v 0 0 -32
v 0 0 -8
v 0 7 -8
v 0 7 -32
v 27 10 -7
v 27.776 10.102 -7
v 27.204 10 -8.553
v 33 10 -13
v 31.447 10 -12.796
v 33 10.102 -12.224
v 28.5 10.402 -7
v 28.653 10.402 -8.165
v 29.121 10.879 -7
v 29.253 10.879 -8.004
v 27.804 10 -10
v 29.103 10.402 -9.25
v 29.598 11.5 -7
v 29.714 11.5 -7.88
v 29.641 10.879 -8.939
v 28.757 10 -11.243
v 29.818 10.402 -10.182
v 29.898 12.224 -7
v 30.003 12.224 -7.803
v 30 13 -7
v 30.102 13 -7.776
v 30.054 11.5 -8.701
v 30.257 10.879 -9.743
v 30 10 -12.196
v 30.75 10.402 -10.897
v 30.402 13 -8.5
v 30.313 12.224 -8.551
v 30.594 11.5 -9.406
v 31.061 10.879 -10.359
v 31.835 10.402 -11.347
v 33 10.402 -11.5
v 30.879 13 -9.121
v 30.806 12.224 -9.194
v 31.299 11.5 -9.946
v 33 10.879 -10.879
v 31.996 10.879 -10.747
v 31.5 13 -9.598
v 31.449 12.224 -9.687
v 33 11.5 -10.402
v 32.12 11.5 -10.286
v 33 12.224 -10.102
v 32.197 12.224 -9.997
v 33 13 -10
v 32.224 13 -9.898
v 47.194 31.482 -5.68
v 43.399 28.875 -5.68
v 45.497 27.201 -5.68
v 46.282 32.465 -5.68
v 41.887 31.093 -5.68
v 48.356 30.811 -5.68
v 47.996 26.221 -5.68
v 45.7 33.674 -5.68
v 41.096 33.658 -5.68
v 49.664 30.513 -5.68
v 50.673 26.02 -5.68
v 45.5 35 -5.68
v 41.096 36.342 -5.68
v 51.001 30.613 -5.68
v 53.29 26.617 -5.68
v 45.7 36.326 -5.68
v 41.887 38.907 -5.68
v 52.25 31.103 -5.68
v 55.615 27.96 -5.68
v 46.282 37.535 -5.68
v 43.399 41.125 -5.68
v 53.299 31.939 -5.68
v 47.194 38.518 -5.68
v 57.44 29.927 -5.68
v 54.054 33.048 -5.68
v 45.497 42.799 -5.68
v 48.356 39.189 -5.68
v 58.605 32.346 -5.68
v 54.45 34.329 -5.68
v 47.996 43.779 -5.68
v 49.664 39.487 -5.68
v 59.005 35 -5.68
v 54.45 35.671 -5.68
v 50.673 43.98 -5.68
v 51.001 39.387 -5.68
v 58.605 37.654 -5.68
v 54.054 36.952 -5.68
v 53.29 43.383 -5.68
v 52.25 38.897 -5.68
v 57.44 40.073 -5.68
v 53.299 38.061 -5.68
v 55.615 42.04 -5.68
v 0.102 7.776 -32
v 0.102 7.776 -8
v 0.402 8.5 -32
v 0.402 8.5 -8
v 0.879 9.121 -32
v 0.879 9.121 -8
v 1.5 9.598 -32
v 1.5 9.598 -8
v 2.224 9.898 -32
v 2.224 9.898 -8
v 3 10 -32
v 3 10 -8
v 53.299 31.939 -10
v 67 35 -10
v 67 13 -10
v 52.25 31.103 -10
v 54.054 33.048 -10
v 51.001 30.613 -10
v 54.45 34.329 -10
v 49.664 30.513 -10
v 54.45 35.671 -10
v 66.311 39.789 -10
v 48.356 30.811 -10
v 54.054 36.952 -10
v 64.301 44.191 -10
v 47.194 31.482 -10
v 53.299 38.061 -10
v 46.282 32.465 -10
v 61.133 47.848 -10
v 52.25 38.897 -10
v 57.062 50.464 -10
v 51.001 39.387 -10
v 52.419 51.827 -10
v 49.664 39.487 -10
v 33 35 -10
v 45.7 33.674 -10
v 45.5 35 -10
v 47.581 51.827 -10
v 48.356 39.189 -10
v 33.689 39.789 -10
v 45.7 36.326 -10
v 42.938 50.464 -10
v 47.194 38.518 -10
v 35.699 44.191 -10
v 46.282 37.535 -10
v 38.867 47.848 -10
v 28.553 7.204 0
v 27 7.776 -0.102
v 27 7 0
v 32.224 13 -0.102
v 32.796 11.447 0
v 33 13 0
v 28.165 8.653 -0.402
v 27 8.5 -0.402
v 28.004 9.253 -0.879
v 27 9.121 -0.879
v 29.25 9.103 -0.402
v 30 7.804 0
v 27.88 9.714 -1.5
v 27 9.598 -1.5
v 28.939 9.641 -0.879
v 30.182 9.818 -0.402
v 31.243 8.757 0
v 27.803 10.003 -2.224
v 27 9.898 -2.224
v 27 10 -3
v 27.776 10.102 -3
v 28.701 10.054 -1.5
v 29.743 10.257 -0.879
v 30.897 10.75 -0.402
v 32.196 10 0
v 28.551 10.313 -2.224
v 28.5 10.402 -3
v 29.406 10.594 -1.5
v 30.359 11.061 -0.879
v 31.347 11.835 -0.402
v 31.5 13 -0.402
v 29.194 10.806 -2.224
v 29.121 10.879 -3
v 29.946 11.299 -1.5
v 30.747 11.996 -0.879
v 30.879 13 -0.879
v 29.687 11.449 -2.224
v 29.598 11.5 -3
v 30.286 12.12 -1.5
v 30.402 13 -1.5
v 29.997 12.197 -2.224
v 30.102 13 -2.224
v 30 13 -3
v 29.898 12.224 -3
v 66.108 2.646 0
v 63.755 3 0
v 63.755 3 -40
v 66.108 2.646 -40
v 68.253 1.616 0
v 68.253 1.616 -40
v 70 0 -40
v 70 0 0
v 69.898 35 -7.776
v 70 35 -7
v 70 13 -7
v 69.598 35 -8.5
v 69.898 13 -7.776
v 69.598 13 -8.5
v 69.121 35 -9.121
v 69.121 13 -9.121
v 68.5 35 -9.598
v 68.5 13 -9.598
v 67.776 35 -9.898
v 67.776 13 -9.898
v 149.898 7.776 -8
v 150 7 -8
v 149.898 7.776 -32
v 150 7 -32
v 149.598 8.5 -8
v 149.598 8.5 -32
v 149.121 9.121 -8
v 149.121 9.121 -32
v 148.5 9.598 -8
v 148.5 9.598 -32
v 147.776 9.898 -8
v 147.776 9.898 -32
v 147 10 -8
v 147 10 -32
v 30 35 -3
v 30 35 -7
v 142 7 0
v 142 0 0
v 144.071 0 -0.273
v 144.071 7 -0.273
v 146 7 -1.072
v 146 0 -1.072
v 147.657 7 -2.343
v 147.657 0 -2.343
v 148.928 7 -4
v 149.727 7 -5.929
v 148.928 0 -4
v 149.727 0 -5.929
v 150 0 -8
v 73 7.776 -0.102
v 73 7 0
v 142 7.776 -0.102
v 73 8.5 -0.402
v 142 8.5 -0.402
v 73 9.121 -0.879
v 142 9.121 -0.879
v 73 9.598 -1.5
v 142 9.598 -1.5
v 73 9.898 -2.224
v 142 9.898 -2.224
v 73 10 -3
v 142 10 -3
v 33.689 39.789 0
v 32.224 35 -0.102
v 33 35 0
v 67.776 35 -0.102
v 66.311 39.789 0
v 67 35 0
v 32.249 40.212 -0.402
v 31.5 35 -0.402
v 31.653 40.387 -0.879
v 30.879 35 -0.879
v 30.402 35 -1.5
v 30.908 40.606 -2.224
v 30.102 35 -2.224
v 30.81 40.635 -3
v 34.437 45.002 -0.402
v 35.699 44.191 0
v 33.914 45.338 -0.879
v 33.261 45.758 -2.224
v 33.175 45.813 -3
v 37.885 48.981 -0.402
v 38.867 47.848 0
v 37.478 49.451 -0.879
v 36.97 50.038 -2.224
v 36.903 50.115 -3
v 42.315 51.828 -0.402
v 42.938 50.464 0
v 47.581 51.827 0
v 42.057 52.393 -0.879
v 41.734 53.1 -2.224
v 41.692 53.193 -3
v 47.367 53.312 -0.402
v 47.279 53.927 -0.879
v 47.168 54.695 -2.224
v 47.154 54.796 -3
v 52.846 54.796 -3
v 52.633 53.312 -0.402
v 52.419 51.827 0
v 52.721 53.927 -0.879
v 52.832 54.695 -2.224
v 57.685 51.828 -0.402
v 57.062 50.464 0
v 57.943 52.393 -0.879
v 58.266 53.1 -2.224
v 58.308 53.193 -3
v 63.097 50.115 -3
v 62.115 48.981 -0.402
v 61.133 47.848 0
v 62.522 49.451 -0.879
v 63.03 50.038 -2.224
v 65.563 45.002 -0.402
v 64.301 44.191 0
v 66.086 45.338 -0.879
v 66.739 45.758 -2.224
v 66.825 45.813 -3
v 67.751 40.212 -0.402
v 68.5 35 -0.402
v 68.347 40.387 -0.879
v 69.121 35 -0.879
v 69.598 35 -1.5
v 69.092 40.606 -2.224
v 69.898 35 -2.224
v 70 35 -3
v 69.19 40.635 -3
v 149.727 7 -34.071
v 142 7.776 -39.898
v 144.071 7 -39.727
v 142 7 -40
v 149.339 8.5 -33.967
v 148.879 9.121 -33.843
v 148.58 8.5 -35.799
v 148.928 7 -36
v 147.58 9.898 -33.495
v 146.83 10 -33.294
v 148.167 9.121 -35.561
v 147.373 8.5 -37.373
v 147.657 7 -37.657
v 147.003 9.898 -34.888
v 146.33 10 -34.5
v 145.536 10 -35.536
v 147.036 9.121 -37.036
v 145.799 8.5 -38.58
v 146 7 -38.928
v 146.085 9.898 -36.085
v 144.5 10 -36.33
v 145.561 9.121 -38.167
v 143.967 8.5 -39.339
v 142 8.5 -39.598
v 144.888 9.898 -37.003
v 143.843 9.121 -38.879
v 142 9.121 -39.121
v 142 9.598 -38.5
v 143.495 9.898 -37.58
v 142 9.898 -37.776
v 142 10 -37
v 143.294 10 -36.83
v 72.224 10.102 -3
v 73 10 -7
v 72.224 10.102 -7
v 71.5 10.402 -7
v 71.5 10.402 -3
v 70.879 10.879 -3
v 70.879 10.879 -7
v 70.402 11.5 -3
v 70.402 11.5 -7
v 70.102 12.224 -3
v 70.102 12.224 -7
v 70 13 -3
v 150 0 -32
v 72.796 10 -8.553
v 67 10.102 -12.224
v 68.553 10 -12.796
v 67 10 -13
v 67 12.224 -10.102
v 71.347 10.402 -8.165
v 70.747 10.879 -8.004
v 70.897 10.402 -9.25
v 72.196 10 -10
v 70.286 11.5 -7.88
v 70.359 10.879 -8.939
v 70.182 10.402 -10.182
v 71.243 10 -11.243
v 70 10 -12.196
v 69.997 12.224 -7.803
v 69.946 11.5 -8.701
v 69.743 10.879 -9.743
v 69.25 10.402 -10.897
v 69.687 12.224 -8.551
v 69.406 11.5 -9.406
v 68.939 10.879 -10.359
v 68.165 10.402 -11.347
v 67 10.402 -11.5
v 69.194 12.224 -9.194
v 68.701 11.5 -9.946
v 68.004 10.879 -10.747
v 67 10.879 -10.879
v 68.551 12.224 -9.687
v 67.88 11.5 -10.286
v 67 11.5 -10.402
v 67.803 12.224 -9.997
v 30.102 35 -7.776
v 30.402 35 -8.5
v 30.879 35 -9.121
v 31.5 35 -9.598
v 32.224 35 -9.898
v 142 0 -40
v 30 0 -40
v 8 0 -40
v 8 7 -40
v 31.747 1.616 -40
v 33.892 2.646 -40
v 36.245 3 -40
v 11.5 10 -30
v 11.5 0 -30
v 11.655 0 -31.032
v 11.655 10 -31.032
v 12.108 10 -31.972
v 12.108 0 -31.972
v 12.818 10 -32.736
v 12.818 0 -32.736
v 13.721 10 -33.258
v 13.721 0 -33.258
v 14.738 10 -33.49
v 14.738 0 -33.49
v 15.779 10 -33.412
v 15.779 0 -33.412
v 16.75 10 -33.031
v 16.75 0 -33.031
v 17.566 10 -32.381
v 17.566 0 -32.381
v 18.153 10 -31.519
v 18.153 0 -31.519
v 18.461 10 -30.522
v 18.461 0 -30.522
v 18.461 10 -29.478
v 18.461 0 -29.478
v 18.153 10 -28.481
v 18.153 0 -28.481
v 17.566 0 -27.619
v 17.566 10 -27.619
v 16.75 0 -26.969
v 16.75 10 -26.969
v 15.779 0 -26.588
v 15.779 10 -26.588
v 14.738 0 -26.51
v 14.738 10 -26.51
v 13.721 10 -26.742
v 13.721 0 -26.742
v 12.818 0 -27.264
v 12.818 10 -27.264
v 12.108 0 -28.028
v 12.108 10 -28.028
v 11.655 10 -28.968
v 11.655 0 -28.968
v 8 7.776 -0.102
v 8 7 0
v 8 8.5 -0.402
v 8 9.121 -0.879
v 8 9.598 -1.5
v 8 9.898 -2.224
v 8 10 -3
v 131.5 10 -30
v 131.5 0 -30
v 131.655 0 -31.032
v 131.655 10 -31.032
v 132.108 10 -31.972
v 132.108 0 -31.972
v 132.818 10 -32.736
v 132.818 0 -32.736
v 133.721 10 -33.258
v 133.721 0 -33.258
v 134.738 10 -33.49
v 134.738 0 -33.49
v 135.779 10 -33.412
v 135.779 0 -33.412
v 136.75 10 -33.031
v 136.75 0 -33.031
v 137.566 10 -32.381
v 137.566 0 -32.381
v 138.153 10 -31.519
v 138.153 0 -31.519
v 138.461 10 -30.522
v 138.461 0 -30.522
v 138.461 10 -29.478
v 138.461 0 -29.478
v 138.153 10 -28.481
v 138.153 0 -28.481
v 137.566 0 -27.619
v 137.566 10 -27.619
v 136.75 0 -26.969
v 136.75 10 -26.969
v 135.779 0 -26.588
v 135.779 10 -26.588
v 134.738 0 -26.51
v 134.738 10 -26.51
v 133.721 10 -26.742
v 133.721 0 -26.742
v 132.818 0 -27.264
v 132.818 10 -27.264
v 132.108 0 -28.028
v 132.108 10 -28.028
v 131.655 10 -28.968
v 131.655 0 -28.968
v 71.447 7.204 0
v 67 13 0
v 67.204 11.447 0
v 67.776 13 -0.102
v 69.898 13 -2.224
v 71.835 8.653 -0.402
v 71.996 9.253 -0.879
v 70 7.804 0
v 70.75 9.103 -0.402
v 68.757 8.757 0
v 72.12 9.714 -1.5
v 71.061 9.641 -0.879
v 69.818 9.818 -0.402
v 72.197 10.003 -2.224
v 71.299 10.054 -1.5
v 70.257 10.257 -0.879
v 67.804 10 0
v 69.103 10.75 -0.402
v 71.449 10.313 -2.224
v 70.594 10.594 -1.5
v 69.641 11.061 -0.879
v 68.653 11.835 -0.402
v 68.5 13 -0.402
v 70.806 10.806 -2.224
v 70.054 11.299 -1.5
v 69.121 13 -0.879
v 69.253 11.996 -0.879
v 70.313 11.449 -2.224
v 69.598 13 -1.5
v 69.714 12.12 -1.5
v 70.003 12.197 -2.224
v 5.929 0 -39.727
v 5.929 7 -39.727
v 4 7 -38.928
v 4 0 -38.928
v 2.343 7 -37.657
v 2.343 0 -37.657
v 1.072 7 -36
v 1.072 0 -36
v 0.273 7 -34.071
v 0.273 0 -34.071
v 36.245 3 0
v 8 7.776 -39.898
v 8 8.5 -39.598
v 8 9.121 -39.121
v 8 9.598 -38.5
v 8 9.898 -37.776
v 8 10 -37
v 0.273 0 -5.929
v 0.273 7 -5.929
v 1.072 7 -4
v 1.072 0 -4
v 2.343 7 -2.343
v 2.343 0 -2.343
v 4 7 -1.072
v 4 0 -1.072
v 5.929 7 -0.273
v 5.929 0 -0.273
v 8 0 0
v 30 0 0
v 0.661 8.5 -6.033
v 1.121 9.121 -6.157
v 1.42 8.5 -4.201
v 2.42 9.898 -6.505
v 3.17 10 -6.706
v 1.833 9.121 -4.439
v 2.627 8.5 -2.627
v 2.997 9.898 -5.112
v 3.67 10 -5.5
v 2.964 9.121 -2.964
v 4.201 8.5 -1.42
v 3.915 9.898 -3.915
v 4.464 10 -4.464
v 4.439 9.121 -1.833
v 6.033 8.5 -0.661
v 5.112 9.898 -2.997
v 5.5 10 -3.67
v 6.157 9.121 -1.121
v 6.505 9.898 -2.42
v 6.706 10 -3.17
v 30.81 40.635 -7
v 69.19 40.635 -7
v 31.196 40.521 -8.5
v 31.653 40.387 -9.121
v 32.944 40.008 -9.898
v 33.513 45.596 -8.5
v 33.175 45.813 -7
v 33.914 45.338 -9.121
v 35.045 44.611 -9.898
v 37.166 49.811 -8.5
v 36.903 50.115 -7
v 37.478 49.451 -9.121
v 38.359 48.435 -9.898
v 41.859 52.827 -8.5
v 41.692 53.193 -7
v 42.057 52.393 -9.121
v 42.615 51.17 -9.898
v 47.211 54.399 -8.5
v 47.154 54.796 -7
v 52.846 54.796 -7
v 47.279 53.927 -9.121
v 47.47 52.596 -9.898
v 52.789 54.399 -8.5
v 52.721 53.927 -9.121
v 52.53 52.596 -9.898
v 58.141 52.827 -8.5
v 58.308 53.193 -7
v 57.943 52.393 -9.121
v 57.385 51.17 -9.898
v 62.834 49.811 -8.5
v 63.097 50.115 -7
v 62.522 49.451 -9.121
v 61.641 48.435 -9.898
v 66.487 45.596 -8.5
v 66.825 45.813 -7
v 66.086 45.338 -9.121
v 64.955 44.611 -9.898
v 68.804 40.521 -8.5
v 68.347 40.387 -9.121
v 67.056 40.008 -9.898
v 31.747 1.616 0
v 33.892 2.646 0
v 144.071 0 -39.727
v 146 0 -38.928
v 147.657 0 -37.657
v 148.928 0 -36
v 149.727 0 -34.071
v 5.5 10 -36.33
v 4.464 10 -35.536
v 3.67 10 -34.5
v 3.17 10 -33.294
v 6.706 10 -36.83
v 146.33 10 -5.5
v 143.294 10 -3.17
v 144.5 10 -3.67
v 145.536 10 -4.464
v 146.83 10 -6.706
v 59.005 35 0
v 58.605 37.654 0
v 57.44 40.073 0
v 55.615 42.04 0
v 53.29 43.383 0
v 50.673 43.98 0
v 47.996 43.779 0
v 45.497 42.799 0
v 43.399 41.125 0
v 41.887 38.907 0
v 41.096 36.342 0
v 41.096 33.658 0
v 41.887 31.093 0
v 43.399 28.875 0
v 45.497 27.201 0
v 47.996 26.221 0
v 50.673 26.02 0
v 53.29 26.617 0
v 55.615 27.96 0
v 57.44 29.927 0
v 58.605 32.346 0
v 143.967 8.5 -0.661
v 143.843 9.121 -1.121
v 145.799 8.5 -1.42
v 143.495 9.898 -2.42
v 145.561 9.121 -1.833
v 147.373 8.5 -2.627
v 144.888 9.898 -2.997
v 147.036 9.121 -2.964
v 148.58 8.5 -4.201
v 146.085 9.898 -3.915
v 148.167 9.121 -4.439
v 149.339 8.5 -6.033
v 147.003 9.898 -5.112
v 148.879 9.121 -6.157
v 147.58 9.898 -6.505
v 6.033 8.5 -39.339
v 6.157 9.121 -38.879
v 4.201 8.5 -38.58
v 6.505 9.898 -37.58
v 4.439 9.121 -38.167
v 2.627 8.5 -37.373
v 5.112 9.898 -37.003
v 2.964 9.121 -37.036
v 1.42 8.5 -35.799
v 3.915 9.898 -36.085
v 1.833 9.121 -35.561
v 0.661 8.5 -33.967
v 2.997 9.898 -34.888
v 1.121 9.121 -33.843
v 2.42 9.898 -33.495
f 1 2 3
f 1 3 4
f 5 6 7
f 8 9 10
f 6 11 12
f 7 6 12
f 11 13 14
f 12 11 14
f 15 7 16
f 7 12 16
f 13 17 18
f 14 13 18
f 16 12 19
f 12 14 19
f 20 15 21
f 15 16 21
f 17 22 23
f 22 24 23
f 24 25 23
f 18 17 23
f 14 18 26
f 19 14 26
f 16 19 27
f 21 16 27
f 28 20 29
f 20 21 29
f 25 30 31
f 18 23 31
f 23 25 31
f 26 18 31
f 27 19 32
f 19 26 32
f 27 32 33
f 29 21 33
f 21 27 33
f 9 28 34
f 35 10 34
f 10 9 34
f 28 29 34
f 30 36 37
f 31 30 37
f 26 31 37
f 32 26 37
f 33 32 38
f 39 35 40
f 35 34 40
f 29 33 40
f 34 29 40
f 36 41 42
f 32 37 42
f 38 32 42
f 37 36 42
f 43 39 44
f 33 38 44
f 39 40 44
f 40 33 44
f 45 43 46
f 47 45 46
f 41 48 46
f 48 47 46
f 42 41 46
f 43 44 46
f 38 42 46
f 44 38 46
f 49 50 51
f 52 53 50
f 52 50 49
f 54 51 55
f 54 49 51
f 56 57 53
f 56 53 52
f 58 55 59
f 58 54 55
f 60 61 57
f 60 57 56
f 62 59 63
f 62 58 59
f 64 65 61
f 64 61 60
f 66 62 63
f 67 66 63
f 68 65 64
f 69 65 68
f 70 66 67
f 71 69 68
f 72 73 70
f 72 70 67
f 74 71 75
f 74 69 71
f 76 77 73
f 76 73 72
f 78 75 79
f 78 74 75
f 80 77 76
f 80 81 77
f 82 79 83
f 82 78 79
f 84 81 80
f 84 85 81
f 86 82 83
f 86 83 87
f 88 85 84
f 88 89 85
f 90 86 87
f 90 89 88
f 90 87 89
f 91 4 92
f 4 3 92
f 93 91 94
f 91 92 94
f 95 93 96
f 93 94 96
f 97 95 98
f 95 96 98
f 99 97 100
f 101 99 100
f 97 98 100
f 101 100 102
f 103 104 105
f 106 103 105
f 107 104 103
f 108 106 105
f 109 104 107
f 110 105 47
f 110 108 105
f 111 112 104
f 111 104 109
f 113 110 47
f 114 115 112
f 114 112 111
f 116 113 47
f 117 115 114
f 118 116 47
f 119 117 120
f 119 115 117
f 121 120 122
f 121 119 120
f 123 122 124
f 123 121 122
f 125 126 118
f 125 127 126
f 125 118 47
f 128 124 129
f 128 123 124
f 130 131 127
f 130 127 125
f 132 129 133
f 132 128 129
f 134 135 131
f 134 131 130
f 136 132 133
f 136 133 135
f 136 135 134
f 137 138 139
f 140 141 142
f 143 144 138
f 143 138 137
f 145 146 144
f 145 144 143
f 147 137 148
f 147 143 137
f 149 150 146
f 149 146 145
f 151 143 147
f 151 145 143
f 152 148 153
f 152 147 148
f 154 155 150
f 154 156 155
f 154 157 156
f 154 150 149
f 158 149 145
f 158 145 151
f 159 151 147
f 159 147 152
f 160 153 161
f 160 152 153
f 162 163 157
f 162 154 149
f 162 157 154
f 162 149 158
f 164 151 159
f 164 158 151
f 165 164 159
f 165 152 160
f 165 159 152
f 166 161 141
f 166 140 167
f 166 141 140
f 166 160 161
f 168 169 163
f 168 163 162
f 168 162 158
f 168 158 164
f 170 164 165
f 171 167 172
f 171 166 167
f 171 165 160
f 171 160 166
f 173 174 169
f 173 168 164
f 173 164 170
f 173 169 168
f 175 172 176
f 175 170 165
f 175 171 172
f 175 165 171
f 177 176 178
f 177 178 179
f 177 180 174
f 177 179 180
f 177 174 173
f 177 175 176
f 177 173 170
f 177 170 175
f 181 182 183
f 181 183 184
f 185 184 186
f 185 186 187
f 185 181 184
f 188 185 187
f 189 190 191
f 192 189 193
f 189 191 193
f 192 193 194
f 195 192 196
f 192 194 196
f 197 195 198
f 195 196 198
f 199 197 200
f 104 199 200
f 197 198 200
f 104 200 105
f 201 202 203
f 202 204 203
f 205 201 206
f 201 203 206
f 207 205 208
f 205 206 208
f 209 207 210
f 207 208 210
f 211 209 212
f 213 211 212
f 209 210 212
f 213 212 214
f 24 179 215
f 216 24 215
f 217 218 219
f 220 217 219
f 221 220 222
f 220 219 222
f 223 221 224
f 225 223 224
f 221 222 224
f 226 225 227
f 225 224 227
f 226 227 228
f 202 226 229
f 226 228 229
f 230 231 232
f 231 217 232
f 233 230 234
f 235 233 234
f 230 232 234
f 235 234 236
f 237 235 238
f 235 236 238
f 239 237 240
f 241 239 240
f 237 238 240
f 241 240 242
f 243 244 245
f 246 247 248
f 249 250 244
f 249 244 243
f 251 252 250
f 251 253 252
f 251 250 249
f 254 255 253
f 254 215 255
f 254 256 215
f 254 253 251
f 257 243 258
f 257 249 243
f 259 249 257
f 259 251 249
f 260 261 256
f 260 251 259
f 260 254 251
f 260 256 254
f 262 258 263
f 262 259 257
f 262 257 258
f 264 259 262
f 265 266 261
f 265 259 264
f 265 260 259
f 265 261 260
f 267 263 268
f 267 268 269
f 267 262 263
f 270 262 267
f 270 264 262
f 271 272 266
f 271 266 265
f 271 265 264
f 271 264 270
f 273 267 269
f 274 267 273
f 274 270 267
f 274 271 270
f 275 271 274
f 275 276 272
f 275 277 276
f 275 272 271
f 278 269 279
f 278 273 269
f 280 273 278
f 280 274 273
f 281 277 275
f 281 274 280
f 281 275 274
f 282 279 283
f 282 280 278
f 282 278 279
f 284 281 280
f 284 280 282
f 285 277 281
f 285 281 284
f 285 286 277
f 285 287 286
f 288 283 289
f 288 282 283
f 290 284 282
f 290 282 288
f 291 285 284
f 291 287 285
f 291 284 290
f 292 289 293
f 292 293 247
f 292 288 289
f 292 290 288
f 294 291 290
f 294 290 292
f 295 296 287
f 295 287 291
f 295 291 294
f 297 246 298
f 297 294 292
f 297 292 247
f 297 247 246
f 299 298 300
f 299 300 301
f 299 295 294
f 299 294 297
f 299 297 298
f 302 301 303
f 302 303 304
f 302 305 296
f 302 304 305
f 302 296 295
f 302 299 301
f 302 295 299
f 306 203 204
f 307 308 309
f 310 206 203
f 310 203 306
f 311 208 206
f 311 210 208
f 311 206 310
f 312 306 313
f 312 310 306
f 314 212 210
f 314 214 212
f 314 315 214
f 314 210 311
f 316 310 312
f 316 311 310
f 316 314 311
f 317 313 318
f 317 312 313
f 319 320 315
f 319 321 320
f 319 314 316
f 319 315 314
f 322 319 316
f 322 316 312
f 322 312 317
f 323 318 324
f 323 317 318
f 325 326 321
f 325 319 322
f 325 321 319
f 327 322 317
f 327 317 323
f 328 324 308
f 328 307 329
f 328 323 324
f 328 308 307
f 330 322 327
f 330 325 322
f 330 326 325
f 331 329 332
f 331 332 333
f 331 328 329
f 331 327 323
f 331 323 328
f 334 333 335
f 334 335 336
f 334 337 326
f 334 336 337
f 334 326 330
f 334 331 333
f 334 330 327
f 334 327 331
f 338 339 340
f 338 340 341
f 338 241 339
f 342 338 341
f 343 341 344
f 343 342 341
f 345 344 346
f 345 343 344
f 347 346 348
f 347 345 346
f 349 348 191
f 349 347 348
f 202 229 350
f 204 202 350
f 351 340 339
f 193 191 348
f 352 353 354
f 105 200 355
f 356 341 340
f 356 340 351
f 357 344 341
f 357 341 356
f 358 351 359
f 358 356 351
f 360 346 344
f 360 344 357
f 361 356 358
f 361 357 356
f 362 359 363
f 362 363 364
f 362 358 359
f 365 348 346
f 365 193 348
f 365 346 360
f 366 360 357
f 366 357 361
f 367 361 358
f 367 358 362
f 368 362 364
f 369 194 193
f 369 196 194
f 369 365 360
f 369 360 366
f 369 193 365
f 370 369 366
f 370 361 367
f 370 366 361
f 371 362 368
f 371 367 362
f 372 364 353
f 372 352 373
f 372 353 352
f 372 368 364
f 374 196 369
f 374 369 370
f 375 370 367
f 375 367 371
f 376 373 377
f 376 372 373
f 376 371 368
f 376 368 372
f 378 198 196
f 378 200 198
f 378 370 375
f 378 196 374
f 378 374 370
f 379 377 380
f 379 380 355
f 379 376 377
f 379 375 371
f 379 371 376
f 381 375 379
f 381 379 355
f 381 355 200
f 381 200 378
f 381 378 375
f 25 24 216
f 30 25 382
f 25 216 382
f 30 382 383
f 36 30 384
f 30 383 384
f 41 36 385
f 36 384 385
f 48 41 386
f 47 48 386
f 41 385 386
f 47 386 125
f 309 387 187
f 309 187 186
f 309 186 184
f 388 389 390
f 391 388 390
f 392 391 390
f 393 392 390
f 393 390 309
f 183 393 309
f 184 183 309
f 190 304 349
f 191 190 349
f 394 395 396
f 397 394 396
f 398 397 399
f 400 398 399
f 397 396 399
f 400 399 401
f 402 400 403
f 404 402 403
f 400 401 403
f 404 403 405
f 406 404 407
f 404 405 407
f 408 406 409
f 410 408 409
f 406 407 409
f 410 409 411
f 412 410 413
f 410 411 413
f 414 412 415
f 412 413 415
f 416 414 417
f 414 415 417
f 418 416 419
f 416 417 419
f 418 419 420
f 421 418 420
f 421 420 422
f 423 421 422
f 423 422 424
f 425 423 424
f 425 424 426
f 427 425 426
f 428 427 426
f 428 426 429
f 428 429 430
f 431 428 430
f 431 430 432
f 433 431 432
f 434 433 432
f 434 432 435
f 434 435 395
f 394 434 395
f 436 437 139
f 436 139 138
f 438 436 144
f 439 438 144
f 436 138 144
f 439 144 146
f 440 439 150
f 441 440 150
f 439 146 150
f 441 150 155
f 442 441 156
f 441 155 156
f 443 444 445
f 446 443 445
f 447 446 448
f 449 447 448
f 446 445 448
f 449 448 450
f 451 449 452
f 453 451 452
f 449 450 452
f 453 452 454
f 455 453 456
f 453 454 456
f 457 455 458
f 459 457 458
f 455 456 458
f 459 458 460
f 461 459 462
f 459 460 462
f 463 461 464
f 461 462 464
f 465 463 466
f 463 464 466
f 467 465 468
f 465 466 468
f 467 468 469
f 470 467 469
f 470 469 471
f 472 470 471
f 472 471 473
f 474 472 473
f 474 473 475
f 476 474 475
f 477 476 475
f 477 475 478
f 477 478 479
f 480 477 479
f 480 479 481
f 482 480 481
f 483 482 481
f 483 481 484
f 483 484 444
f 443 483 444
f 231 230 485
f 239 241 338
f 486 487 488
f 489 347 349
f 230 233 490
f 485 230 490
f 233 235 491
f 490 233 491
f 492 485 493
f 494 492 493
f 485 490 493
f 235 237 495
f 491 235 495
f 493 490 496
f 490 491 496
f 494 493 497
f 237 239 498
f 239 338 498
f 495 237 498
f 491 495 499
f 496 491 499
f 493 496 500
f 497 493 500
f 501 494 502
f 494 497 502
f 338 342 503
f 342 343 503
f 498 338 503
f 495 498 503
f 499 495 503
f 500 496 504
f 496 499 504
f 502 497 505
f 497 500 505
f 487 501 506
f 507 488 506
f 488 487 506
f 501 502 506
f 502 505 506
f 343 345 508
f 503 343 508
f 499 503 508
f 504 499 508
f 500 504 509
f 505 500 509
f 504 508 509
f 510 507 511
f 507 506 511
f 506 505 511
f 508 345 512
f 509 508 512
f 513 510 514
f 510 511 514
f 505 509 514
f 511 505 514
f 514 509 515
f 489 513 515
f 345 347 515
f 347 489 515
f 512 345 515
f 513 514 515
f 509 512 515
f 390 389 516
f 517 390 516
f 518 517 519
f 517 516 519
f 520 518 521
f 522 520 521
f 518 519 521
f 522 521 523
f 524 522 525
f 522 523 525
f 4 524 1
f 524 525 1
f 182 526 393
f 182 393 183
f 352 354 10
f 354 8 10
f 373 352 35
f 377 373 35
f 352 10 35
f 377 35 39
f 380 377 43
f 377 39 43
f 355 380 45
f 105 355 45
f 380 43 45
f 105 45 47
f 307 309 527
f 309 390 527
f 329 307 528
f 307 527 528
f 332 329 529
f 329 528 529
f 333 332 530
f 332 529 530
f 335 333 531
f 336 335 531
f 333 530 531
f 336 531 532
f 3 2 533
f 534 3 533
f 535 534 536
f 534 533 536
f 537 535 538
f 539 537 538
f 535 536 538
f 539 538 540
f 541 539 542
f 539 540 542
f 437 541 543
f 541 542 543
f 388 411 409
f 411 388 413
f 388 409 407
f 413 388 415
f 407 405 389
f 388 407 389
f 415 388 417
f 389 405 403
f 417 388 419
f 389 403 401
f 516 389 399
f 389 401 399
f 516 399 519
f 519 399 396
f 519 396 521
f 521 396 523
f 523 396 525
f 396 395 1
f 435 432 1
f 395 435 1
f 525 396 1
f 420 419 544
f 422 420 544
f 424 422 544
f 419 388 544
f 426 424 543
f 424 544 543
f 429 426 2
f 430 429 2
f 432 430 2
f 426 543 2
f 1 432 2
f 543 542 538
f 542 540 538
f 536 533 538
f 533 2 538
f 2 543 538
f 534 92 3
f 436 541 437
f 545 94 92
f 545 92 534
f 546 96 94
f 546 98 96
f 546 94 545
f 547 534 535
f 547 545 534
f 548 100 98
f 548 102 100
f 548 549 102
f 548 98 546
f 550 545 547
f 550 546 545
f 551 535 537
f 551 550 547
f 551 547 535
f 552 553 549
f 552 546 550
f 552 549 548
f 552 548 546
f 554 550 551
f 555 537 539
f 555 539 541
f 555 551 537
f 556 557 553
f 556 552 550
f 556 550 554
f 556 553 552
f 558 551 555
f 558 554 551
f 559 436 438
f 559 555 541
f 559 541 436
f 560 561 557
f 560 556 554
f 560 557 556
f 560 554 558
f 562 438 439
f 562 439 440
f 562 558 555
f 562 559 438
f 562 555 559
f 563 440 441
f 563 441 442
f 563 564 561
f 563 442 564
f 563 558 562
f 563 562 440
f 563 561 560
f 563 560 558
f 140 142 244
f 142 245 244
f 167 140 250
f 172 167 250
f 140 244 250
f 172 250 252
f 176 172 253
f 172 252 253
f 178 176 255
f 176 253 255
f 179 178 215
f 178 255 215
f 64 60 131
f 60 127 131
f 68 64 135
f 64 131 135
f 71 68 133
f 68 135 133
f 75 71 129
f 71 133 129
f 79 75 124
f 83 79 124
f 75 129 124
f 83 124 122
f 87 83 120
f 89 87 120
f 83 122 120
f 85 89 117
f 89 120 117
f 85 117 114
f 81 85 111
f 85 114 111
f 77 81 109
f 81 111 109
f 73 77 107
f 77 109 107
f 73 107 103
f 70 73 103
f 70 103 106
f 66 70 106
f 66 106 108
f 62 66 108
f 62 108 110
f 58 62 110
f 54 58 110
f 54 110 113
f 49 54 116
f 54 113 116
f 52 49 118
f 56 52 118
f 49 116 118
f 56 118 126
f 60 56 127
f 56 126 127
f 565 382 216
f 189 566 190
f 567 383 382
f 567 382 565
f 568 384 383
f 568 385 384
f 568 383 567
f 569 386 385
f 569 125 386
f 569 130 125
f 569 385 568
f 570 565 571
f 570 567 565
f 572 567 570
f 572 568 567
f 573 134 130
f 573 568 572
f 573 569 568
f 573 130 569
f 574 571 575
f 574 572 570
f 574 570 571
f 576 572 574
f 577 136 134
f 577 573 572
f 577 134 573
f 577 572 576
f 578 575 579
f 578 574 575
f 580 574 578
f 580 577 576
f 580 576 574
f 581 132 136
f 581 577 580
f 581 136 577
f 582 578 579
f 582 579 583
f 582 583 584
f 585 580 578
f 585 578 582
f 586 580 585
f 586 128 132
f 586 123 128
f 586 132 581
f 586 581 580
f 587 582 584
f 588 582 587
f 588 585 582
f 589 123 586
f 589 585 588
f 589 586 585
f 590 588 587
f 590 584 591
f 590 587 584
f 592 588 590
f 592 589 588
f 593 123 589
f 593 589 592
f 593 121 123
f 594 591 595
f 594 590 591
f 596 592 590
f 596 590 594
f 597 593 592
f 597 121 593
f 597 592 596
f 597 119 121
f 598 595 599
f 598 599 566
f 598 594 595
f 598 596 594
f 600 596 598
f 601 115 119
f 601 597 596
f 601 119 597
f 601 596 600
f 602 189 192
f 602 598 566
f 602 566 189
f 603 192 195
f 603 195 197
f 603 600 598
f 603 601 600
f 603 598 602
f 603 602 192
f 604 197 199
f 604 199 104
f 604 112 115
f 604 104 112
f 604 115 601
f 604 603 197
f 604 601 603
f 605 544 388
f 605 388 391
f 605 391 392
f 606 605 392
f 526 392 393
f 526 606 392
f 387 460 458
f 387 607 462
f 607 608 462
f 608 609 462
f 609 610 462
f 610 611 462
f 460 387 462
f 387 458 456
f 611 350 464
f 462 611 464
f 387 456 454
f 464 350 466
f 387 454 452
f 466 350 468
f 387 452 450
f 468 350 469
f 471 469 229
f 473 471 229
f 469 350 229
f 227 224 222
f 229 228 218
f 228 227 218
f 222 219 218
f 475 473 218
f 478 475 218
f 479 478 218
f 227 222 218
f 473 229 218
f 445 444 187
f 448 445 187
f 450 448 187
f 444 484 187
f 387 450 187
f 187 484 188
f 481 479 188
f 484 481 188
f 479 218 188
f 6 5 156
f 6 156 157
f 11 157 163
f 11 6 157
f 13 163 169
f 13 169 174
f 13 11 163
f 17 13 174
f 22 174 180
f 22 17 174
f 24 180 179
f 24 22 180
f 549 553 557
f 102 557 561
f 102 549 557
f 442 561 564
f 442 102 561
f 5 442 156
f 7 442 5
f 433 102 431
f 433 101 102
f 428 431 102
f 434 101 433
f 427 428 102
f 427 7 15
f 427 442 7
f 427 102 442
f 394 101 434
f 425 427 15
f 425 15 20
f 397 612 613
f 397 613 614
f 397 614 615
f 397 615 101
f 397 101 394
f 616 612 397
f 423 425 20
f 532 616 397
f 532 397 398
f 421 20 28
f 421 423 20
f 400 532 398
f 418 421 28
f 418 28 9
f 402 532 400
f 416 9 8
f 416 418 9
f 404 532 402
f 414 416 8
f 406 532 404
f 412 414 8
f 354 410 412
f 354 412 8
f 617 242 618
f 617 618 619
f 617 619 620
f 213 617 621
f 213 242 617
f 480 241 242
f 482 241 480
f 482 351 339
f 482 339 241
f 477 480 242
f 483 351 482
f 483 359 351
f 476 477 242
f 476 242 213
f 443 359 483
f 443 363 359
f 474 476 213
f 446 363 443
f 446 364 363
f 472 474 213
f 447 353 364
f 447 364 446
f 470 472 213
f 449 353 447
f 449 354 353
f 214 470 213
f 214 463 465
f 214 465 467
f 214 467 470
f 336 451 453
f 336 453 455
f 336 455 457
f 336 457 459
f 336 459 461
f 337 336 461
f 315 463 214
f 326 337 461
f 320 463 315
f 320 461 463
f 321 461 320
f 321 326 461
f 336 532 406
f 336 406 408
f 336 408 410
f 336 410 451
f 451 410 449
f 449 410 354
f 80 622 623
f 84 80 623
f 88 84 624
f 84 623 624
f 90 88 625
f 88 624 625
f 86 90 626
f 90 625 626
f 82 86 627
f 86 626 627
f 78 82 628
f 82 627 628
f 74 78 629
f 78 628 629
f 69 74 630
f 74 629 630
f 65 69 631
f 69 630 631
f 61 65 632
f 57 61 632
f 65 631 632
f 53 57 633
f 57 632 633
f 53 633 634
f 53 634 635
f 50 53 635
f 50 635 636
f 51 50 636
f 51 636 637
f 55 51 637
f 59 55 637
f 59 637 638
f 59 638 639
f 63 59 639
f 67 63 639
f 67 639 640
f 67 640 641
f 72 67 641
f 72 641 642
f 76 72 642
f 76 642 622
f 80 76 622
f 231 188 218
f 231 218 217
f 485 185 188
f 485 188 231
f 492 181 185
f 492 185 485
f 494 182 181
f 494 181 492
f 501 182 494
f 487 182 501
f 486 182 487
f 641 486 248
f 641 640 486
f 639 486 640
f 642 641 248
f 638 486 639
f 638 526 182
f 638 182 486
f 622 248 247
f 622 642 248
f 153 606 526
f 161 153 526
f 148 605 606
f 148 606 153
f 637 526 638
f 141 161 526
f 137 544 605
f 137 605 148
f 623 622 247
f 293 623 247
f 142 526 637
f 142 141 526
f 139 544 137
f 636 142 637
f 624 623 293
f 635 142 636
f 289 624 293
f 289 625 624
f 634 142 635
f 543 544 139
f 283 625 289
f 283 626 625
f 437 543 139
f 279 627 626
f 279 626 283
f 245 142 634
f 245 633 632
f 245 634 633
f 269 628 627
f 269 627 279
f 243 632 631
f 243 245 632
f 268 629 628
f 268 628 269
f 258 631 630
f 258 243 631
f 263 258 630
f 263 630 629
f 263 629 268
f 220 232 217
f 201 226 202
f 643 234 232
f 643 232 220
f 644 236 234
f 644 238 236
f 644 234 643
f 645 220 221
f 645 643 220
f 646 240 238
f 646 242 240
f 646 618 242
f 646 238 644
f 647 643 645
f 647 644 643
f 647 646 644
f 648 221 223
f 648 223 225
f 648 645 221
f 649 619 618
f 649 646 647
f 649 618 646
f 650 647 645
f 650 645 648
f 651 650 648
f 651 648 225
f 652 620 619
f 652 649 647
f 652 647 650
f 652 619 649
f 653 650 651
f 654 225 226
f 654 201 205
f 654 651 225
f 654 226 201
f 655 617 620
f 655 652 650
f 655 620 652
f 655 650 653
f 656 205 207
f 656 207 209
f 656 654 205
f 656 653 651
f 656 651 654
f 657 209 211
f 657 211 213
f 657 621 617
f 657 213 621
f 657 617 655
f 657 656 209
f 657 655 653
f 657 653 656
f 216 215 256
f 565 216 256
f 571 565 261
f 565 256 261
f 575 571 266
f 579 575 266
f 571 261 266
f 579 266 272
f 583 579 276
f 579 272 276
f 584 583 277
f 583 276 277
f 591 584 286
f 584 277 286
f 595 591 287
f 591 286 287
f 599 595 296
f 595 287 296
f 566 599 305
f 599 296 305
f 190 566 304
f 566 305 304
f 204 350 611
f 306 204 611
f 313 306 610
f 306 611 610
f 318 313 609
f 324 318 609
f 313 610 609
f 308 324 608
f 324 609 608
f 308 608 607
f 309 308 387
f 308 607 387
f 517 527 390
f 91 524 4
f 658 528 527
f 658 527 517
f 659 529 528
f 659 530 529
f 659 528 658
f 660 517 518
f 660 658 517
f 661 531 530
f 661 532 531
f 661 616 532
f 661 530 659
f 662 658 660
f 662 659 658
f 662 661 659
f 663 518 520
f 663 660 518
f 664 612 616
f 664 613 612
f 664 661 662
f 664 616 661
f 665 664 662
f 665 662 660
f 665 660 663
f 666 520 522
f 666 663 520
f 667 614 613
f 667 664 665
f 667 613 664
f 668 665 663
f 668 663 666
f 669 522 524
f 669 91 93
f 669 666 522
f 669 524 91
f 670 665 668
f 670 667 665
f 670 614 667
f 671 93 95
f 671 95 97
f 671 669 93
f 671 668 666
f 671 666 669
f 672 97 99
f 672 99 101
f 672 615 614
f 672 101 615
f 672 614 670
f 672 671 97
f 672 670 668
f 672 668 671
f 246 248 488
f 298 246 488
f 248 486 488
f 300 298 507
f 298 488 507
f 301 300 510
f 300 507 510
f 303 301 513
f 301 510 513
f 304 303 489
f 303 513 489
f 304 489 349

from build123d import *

# Parameters (mm, degrees)
SKETCH_1_W                   = 150
SKETCH_1_H                   = 40
BASEPLATE_DEPTH              = 10
VERTBOSS_DEPTH               = 10
SKETCH_3_W                   = 40
SKETCH_3_H                   = 3
BOTTOMSOLT_DEPTH             = 165.69669092
HOLE_WIZARD_M8_1_D           = 9
HOLE_WIZARD_M8_1_CBORE_D     = 18.01
HOLE_WIZARD_M8_1_CBORE_DEPTH = 5.68
HOLE_WIZARD_7_0_7_1_D        = 7
FILLET_1_R                   = 8
FILLET_2_R                   = 3


with BuildPart() as part:
    # 草圖1 → BasePlate (new body)
    with BuildSketch(Plane(origin=(0, 0, 0), x_dir=(1, 0, 0), z_dir=(0, 1, 0))):
        with Locations((75, 20)):
            Rectangle(SKETCH_1_W, SKETCH_1_H)
    extrude(amount=BASEPLATE_DEPTH)

    # 草圖2 → VertBoss (add)
    with BuildSketch(Plane.XY):
        with BuildLine():
            Line((30, 0), (30, 35))
            ThreePointArc((30, 35), (50, 55), (70, 35))
            Line((70, 35), (70, 0))
            Line((70, 0), (30, 0))
        make_face()
    extrude(amount=-VERTBOSS_DEPTH)

    # 草圖3 → BottomSolt (cut, through all)
    with BuildSketch(Plane.XY):
        with Locations((50, 1.5)):
            Rectangle(SKETCH_3_W, SKETCH_3_H)
    extrude(amount=-BOTTOMSOLT_DEPTH, mode=Mode.SUBTRACT)

    # M8 六角頭螺栓的柱孔1 (through all)
    with Locations(Plane.XY):
        with Locations((50, 35)):
            CounterBoreHole(HOLE_WIZARD_M8_1_D / 2, HOLE_WIZARD_M8_1_CBORE_D / 2, HOLE_WIZARD_M8_1_CBORE_DEPTH)

    # Ø7.0 (7) 直徑孔1 (through all)
    with Locations(Plane(origin=(0, 10, 0), x_dir=(1, 0, 0), z_dir=(0, 1, 0))):
        with Locations((15, 30), (135, 30)):
            Hole(HOLE_WIZARD_7_0_7_1_D / 2)

    # 圓角1
    # the kernel refuses this fillet: 8 mm, written as the material it adds along each edge
    with BuildSketch(Plane(origin=(70, 3, 0), x_dir=(-1, 0, 0), z_dir=(0, 0, -1))) as fillet_1_piece_1:
        with BuildLine():
            CenterArc((6.244997998, -8), FILLET_1_R, 90, 51.317812547)
            Line((0, -3), (0, 0))
            Line((0, 0), (6.244997998, 0))
        make_face()
    extrude(amount=40)
    with BuildSketch(Plane(origin=(30, 3, 0), x_dir=(0, -1, 0), z_dir=(0, 0, -1))) as fillet_1_piece_2:
        with BuildLine():
            CenterArc((8, -6.244997998), FILLET_1_R, 128.682187453, 51.317812547)
            Line((0, -6.244997998), (0, 0))
            Line((0, 0), (3, 0))
        make_face()
    extrude(amount=40)
    # the kernel refuses this fillet: 8 mm, written as the material it takes off along each edge
    with BuildSketch(Plane(origin=(0, -20, 0), x_dir=(1, 0, 0), z_dir=(0, 1, 0)), Plane(origin=(0, -20, -40), x_dir=(0, 0, 1), z_dir=(0, 1, 0))) as fillet_1_2_piece_1:
        with BuildLine():
            CenterArc((FILLET_1_R, FILLET_1_R), FILLET_1_R, 180, 90)
            Line((0, FILLET_1_R), (0, 0))
            Line((0, 0), (FILLET_1_R, 0))
        make_face()
    extrude(amount=50, mode=Mode.SUBTRACT)
    with BuildSketch(Plane(origin=(150, -20, 0), x_dir=(-1, 0, 0), z_dir=(0, 1, 0)), Plane(origin=(150, -20, -40), x_dir=(0, 0, 1), z_dir=(0, 1, 0))) as fillet_1_2_piece_2:
        with BuildLine():
            CenterArc((FILLET_1_R, -FILLET_1_R), FILLET_1_R, 90, 90)
            Line((0, -FILLET_1_R), (0, 0))
            Line((0, 0), (FILLET_1_R, 0))
        make_face()
    extrude(amount=50, mode=Mode.SUBTRACT)

    # 圓角2
    fillet_2_edges = [part.edges().sort_by_distance(p)[0] for p in [
        (106, 10, 0),
        (30, 22.5, -10),
        (70, 22.5, -10),
        (30, 22.5, 0),
        (70, 22.5, 0),
        (50, 55, 0),
        (30, 10, -5),
        (50, 55, -10),
        (70, 10, -5),
        (50, 10, -10),
        (19, 10, 0),
        (0, 10, -20),
        (150, 10, -20),
        (75, 10, -40),
        (147.656854249, 10, -37.656854249),
        (147.656854249, 10, -2.343145751),
        (2.343145751, 10, -37.656854249),
        (2.343145751, 10, -2.343145751),
    ]]
    fillet(fillet_2_edges, radius=FILLET_2_R)


solid = part.part
